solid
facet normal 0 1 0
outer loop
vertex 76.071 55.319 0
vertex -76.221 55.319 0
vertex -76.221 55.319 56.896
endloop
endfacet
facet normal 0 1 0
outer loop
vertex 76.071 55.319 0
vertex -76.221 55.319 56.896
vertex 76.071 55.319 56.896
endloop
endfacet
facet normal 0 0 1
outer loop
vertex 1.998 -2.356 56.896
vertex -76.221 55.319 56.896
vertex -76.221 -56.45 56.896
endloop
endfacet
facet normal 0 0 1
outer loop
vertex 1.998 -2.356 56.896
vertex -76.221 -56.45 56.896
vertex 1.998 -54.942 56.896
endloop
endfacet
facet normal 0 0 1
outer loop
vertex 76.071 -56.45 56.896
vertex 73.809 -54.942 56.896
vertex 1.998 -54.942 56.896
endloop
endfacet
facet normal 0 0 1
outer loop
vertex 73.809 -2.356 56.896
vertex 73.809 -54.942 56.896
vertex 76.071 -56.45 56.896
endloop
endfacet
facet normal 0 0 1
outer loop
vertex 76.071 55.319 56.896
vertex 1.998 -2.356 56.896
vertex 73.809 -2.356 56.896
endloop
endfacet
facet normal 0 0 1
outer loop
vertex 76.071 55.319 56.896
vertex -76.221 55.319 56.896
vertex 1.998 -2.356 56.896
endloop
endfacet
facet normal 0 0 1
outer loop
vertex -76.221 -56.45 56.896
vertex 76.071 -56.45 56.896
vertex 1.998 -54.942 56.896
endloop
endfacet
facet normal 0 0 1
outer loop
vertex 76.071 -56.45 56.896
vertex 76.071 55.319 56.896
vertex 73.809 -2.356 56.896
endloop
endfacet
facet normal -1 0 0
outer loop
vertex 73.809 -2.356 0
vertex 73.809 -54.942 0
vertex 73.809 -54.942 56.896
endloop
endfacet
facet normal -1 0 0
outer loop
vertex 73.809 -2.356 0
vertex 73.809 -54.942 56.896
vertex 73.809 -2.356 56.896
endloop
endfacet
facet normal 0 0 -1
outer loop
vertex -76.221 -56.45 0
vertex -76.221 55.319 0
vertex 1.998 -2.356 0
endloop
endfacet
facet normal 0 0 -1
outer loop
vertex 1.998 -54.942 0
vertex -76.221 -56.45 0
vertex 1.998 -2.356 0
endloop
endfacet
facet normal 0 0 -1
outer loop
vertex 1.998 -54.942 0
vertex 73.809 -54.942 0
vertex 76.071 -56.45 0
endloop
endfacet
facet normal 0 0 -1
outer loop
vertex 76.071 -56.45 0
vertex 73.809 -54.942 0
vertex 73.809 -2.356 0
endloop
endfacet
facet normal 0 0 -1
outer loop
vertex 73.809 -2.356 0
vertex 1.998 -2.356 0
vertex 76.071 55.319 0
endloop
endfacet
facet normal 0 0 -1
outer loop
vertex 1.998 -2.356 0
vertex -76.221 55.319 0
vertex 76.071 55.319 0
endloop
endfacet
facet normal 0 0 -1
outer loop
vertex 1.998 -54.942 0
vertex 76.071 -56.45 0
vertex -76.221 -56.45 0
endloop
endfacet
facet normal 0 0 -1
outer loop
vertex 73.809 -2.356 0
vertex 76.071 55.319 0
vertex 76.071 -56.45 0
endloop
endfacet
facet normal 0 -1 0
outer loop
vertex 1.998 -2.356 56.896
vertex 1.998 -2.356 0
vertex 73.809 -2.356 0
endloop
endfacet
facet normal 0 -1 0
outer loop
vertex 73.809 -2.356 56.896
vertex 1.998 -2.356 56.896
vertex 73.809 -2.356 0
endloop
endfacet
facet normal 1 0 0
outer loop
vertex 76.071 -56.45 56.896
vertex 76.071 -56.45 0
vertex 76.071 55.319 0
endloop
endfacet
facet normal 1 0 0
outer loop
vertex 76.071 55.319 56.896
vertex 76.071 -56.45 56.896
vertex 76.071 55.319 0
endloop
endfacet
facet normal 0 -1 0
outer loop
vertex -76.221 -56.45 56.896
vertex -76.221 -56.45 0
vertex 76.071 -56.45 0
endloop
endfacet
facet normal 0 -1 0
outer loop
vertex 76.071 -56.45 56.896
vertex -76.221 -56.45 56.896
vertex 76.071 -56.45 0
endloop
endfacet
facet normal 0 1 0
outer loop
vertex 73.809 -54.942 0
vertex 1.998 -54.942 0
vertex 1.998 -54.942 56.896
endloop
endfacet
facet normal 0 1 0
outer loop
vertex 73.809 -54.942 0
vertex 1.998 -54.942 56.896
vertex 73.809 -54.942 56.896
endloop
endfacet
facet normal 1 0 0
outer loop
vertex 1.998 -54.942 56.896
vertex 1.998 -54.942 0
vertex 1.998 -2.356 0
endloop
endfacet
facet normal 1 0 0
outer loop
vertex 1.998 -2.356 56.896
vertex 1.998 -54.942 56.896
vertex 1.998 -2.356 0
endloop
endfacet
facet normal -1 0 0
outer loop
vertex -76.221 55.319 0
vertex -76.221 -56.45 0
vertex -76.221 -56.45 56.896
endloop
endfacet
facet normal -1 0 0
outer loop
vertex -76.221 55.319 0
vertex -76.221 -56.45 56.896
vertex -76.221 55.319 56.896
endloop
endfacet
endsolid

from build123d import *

# Parameters (mm, degrees)
F0_W     = 75.1286000013
F0_H     = 75.6749510765
F1_DEPTH = 25.4
F3_W     = 152.2922962904
F3_H     = 111.7689795792
F3_W_2   = 71.8111011665
F3_H_2   = 52.5860791095
F4_DEPTH = 56.896


with BuildPart() as f1:
    # F0 (on Top) → F1 (new body)
    with BuildSketch(Plane.XY):
        with Locations((37.5643000007, -37.8374755383)):
            Rectangle(F0_W, F0_H)
    extrude(amount=F1_DEPTH)


with BuildPart() as f4:
    # F3 (on Top) → F4 (new body)
    with BuildSketch(Plane.XY):
        with Locations((-0.0751465559, -0.5654413253)):
            Rectangle(F3_W, F3_H)
        with Locations((37.9036931554, -28.6490467843)):
            Rectangle(F3_W_2, F3_H_2, mode=Mode.SUBTRACT)
    extrude(amount=F4_DEPTH)


solid = f4.part
